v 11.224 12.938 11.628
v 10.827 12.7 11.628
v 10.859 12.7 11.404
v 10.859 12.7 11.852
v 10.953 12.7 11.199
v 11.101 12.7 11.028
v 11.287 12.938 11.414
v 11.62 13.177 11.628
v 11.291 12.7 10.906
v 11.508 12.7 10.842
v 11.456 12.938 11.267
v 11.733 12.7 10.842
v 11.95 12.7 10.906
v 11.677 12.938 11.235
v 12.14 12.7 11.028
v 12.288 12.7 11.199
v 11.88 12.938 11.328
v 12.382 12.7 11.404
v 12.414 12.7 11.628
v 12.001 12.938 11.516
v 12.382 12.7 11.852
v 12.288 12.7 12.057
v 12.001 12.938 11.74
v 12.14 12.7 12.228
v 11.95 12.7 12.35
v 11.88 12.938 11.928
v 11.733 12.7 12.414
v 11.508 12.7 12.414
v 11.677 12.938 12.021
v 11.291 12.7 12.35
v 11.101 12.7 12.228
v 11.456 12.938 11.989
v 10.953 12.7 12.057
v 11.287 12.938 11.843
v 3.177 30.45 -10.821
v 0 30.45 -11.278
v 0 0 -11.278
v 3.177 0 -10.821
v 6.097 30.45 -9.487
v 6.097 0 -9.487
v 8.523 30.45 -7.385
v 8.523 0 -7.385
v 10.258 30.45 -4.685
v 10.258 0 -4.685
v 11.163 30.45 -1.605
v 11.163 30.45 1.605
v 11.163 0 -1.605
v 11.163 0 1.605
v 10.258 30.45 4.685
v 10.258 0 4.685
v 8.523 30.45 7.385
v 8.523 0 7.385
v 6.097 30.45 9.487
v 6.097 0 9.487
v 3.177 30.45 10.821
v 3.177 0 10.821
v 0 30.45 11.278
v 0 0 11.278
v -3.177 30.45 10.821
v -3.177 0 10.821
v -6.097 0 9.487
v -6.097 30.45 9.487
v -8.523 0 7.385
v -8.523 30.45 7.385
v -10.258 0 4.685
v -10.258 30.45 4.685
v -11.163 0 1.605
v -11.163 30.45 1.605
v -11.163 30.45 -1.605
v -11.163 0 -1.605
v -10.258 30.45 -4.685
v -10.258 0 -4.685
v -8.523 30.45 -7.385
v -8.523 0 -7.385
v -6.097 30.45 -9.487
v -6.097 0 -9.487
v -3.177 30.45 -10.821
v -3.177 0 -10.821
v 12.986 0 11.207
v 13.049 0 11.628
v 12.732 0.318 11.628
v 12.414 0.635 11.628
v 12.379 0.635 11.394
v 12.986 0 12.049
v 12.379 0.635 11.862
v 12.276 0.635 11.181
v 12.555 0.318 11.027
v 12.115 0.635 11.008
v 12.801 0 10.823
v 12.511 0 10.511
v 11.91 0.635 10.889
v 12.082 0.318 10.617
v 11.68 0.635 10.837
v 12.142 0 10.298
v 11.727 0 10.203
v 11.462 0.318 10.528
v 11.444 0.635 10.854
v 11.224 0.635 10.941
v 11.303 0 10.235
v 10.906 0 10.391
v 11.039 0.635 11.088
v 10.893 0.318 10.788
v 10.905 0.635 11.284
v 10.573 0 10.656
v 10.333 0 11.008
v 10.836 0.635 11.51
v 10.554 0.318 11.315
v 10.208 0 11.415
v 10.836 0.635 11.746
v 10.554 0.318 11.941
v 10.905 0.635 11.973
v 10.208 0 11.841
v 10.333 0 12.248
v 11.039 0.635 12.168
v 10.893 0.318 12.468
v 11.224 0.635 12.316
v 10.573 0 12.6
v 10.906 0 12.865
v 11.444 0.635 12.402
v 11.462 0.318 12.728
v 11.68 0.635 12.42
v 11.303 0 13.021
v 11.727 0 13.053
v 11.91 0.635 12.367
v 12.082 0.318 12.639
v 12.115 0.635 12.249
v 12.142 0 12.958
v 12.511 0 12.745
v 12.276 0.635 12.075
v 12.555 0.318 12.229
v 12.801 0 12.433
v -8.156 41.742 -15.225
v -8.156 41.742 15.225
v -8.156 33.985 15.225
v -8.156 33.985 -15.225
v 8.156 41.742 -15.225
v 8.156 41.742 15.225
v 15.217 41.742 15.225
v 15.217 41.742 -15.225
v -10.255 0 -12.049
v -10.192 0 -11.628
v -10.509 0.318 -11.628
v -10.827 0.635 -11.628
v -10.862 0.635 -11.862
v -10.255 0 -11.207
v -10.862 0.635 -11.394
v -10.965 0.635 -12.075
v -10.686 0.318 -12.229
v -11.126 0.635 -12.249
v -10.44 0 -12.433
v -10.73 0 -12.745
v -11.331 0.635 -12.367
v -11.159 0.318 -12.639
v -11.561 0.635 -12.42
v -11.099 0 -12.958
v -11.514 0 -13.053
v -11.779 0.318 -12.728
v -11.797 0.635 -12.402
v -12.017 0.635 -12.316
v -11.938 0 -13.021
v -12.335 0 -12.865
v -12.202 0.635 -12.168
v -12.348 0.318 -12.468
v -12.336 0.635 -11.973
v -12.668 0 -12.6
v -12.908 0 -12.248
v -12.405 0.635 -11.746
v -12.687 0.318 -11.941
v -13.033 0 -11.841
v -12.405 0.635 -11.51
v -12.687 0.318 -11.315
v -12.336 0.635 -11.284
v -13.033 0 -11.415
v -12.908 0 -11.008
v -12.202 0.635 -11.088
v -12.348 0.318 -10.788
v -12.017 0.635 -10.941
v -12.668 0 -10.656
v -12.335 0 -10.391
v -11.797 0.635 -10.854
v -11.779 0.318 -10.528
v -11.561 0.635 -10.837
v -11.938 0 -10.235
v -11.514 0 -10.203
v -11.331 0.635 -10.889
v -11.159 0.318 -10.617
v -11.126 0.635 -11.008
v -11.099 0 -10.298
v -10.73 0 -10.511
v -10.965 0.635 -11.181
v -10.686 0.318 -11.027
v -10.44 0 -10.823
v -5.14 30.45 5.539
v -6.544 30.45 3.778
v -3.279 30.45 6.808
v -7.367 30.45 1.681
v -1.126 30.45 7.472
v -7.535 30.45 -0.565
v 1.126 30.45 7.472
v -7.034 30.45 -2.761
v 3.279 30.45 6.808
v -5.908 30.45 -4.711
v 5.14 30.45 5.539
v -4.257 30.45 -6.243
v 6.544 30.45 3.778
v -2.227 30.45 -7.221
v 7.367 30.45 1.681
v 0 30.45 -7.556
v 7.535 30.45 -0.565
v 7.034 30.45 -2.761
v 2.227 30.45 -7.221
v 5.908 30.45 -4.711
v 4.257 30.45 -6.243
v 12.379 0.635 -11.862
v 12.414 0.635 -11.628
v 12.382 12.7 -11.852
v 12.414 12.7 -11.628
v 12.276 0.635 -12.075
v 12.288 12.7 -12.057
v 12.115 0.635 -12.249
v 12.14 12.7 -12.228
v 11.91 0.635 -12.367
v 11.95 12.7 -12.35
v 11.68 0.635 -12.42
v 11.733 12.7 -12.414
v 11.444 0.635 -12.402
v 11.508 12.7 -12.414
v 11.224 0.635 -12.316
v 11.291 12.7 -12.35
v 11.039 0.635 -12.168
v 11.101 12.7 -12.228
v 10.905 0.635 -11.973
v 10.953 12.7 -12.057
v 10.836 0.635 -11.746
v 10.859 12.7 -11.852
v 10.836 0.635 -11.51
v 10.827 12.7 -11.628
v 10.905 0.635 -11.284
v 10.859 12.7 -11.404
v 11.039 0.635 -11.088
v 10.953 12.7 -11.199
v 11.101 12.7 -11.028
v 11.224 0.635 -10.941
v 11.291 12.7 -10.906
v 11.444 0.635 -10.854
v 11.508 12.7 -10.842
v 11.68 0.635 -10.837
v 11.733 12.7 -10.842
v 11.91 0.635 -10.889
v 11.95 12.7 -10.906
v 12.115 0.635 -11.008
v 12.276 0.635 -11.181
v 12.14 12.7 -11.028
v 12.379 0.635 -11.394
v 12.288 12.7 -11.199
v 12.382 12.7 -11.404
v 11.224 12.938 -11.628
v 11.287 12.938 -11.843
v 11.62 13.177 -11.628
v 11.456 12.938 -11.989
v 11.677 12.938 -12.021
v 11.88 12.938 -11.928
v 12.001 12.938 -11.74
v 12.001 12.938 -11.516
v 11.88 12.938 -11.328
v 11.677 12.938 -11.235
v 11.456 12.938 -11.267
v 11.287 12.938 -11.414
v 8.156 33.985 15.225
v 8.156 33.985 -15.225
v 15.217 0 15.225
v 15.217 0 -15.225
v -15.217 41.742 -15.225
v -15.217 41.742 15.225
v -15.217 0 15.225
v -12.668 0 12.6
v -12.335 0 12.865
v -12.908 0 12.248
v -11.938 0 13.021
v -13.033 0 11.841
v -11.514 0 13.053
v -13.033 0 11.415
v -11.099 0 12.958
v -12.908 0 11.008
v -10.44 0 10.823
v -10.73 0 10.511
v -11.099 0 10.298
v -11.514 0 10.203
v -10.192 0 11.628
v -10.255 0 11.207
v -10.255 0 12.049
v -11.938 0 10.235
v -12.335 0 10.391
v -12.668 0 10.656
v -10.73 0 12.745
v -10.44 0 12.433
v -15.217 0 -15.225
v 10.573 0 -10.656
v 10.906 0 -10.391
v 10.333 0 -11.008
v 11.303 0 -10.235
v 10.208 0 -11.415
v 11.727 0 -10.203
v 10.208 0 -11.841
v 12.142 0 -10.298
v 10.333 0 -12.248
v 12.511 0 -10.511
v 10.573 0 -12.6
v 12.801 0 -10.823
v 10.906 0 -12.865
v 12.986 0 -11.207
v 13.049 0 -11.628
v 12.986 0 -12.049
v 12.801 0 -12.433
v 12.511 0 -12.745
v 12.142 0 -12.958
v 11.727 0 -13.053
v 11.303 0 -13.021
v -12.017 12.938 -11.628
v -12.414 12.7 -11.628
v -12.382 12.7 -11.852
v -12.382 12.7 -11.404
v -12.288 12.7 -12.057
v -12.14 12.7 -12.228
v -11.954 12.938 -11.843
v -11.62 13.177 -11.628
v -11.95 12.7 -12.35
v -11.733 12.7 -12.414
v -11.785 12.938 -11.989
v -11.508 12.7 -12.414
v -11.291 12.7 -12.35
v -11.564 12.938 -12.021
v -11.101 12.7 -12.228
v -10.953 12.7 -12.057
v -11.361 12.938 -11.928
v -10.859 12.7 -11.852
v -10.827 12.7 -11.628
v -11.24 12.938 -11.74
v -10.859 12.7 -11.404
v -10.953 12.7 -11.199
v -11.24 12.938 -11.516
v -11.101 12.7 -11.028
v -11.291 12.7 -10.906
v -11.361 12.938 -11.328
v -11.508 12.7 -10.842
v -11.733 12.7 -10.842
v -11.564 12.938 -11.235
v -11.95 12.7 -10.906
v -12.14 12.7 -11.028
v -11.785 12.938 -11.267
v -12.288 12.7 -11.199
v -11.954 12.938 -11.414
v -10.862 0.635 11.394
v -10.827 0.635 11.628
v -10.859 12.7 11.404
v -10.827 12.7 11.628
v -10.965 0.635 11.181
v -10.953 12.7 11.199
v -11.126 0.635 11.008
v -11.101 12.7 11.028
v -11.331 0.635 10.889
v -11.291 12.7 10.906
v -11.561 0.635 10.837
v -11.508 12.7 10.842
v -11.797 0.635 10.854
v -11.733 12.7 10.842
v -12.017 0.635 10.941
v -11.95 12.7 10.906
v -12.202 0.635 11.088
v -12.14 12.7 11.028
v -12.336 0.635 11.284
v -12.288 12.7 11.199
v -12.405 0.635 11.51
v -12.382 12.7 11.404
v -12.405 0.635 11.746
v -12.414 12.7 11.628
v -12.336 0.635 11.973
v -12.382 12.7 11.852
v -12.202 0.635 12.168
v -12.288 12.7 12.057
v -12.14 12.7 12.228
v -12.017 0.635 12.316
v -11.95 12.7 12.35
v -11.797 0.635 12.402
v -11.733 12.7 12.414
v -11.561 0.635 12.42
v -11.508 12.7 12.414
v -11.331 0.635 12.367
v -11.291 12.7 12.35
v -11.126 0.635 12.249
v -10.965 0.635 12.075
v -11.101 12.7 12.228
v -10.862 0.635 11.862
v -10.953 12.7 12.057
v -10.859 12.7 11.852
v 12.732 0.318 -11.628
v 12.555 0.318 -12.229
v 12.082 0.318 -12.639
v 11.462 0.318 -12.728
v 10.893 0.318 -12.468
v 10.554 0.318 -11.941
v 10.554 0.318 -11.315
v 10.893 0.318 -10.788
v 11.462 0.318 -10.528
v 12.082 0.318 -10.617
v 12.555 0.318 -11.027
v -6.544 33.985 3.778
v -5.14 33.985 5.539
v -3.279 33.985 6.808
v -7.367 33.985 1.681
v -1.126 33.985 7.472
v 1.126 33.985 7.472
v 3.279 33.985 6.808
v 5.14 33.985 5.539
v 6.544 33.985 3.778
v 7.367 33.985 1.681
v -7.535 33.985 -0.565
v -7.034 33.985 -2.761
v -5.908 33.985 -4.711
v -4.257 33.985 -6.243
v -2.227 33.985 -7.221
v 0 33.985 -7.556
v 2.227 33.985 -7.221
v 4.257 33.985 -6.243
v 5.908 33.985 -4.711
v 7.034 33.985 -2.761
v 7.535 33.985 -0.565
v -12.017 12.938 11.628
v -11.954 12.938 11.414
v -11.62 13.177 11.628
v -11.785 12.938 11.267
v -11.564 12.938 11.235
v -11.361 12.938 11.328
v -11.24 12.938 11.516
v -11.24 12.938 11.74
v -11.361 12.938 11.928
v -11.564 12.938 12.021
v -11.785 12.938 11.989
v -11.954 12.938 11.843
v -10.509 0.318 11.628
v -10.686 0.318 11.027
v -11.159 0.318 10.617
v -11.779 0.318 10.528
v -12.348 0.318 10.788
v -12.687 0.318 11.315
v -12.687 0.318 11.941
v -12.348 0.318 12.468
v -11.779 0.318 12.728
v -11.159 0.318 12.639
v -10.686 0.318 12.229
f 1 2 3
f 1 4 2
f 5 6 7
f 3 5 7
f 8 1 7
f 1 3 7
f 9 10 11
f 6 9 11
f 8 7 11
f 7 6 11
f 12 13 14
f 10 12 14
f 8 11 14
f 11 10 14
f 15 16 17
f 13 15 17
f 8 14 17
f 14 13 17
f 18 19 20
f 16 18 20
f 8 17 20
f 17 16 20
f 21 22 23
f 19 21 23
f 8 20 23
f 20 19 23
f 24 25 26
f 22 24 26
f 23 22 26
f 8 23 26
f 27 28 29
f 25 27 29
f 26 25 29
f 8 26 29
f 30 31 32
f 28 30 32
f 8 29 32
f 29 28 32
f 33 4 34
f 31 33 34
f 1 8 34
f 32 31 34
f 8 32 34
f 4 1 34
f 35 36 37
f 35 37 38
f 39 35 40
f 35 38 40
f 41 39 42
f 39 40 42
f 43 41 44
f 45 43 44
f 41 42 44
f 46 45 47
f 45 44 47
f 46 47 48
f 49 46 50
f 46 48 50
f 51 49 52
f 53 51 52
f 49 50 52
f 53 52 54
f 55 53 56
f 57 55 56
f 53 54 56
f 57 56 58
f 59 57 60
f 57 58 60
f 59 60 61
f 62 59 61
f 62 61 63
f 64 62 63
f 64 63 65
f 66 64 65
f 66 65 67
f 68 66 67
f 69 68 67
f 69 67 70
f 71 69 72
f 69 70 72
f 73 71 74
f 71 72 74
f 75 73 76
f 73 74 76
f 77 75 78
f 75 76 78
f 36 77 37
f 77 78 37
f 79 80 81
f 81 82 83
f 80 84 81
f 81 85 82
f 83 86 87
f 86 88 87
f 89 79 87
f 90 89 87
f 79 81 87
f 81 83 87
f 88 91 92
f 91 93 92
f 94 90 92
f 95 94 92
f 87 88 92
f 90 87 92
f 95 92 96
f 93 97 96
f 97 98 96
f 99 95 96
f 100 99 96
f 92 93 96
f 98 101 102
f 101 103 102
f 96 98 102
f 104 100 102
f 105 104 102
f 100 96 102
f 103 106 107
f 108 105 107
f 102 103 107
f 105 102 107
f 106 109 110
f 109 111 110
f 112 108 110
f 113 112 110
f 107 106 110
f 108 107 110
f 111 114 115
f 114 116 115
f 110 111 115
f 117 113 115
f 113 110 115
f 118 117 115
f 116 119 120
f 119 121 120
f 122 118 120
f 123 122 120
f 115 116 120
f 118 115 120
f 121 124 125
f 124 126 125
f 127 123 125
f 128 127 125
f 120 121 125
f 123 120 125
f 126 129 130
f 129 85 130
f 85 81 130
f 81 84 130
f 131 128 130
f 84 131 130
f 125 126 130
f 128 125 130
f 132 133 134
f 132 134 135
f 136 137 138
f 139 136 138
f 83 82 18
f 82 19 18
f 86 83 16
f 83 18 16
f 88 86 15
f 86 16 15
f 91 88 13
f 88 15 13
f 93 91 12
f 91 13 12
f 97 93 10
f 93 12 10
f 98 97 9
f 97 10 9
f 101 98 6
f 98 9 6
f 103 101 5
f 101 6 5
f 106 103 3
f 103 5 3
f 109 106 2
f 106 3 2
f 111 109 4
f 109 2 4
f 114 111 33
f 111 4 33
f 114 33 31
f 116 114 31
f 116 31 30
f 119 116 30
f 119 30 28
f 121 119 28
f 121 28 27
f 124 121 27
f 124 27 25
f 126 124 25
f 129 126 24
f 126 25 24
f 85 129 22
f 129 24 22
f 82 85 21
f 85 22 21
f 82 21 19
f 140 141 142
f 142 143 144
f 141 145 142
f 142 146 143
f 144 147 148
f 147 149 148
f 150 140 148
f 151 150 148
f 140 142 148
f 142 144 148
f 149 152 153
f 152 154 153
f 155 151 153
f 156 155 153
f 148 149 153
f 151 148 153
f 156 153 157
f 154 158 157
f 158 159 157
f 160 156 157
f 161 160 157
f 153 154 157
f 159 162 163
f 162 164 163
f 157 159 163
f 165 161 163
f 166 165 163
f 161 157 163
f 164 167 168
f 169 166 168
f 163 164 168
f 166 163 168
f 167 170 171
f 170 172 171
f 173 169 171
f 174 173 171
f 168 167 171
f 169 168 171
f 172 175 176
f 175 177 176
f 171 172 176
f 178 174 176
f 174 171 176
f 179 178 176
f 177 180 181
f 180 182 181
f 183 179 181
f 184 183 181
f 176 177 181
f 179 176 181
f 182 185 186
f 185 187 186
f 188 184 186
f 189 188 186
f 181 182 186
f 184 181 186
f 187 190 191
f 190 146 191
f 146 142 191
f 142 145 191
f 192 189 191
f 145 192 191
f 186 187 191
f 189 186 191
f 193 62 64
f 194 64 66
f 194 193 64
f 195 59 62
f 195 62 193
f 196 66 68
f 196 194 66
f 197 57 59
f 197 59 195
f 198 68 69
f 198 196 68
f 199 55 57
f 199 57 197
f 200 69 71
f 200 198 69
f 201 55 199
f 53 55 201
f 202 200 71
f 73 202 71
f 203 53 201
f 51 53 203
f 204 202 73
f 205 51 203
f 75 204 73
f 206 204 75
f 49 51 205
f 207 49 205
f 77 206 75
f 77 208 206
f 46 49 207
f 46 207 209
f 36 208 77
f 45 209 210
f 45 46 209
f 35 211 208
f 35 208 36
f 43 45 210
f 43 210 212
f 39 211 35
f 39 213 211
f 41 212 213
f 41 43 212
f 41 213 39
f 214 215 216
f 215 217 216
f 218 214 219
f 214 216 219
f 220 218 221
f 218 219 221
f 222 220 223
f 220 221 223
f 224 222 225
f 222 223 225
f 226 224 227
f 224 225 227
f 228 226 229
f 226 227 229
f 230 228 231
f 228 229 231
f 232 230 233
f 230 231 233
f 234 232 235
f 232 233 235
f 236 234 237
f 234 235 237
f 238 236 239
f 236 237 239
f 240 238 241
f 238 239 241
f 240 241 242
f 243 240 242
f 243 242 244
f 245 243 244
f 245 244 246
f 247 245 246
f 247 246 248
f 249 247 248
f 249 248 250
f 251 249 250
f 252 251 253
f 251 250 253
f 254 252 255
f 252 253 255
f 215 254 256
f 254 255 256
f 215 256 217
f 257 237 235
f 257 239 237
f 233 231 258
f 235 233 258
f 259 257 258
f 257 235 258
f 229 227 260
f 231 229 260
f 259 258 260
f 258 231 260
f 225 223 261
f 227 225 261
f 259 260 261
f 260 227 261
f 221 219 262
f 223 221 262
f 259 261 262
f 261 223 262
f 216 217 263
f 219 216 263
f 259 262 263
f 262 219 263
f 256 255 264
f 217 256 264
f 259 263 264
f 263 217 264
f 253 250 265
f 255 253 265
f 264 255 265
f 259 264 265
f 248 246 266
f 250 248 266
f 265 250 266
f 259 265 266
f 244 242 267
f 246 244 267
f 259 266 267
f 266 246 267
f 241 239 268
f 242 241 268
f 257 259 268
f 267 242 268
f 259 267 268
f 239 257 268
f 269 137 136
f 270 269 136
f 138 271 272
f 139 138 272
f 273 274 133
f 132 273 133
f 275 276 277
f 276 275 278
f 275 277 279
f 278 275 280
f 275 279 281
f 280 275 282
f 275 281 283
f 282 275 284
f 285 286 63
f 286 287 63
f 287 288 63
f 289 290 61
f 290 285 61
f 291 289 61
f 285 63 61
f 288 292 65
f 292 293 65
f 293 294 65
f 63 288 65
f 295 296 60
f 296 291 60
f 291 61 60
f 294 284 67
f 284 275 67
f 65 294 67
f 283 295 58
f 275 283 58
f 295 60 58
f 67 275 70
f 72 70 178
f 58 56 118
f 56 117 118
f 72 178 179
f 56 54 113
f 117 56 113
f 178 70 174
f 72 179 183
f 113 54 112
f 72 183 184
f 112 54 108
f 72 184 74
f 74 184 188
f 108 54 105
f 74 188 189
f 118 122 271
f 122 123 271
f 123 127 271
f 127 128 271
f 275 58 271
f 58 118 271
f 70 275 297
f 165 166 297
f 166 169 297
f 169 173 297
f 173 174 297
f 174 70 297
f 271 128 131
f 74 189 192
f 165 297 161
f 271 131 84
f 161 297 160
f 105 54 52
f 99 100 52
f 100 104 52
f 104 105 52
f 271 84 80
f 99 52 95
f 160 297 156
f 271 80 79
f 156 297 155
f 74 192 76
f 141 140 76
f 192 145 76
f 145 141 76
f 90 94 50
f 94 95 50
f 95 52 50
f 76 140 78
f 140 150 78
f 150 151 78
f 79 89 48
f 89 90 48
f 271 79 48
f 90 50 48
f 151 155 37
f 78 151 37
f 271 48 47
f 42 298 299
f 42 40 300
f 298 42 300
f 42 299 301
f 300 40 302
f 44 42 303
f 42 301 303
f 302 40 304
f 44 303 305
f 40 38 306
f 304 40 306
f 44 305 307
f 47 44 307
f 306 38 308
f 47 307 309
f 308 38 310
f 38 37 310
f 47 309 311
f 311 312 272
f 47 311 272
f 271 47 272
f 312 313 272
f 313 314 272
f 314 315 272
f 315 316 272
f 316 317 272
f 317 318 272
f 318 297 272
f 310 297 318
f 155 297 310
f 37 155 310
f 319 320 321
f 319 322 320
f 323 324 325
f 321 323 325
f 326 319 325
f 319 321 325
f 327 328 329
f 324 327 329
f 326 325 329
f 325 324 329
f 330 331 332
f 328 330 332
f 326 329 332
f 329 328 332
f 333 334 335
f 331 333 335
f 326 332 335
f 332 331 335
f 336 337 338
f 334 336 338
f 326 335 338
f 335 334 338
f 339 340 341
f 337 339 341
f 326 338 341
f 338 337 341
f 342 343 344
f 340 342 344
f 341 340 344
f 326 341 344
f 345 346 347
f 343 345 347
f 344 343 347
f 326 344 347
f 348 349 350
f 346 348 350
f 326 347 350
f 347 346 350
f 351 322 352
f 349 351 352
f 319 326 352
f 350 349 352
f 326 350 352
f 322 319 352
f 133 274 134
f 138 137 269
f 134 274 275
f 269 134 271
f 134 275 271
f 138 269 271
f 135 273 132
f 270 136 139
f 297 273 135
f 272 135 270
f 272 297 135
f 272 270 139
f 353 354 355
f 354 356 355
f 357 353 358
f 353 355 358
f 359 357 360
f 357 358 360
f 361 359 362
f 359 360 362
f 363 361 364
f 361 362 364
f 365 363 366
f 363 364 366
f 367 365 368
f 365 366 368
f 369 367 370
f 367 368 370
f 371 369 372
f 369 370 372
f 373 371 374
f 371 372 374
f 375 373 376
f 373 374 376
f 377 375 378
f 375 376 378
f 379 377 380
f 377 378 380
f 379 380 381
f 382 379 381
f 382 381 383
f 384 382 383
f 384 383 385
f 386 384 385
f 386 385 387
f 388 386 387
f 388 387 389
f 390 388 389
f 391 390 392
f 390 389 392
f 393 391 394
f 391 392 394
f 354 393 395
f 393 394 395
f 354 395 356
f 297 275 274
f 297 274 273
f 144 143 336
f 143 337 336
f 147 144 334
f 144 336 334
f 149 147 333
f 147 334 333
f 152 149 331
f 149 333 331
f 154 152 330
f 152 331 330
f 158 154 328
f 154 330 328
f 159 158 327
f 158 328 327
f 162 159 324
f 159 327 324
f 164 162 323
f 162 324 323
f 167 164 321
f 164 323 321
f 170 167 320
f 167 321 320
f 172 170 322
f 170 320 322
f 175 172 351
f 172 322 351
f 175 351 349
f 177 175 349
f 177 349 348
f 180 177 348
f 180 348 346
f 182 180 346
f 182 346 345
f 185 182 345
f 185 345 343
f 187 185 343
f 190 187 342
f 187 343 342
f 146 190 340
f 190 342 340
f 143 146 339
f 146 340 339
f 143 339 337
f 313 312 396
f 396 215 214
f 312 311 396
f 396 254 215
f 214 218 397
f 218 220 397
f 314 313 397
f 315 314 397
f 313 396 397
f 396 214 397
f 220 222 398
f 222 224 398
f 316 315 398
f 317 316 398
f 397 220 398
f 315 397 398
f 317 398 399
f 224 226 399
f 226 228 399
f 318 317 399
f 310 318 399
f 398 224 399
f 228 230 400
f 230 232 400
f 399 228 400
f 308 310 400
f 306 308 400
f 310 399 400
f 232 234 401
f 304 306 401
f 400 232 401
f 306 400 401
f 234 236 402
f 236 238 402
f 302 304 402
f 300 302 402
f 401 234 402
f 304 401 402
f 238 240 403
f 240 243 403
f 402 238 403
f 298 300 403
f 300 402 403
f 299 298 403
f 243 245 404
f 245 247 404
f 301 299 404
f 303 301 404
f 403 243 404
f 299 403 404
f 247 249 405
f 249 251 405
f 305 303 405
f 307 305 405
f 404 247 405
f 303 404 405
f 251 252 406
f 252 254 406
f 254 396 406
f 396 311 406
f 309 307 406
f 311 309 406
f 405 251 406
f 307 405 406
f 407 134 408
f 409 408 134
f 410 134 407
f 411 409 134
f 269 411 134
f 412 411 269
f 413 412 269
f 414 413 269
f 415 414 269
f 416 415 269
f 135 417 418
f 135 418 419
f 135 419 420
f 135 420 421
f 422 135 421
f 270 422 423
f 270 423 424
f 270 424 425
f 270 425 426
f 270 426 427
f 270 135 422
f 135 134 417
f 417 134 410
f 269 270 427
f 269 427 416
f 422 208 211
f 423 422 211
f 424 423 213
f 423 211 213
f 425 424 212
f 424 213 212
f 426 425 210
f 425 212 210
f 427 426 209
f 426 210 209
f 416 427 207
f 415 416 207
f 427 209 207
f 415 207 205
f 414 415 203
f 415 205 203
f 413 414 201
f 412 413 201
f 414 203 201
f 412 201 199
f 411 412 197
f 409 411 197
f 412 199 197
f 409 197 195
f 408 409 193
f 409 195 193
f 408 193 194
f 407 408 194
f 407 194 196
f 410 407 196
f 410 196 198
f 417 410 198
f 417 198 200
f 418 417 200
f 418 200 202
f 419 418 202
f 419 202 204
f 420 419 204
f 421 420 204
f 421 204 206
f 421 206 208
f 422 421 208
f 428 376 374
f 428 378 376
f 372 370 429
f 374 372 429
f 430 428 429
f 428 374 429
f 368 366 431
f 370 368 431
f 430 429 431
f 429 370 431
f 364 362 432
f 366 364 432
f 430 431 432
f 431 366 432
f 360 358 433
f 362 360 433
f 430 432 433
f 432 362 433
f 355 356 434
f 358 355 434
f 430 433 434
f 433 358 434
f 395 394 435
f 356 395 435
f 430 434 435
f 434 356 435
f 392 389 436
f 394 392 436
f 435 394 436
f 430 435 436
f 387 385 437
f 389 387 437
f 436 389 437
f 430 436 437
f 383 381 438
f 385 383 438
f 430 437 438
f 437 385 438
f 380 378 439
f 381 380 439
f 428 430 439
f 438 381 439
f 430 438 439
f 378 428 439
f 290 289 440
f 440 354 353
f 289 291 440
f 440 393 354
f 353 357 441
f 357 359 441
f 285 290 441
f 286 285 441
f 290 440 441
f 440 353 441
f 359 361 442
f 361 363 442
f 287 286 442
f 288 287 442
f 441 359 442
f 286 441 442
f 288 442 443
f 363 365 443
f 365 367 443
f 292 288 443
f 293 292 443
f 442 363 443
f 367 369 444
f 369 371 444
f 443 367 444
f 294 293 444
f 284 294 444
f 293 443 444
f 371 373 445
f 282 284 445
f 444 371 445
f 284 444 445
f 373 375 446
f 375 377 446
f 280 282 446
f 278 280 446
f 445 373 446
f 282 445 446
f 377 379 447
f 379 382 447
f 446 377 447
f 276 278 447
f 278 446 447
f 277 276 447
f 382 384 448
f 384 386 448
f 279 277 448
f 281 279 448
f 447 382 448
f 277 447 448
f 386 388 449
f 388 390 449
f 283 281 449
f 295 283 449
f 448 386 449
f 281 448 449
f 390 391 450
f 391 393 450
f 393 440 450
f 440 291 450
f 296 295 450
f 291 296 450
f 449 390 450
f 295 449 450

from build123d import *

# Parameters (mm, degrees)
SKETCH1_W                                = 30.43428
SKETCH1_H                                = 30.44952
BOSS_EXTRUDE1_DEPTH                      = 41.74236
SKETCH4_R                                = 7.5565
CUT_EXTRUDE3_DEPTH                       = 36.539424
SKETCH6_W                                = 16.31188
SKETCH6_H                                = 30.44952
CUT_EXTRUDE5_DEPTH                       = 7.75716
SKETCH8_R                                = 11.2776
CUT_EXTRUDE6_DEPTH                       = 30.44952
F_1_16_0_0625_DIAMETER_HOLE1_D           = 1.5875
F_1_16_0_0625_DIAMETER_HOLE1_DEPTH       = 12.7
F_1_16_0_0625_DIAMETER_HOLE1_CSINK_D     = 2.8575
F_1_16_0_0625_DIAMETER_HOLE1_CSINK_ANGLE = 90
F_1_16_0_0625_DIAMETER_HOLE1_TIP         = 0.476933116


with BuildPart() as part:
    # Sketch1 → Boss-Extrude1 (new body)
    with BuildSketch(Plane(origin=(0, 0, 0), x_dir=(1, 0, 0), z_dir=(0, 1, 0))):
        Rectangle(SKETCH1_W, SKETCH1_H)
    extrude(amount=BOSS_EXTRUDE1_DEPTH)

    # Sketch4 → Cut-Extrude3 (cut)
    with BuildSketch(Plane.XZ):
        with Locations(Location((0, 0, 0), (0, 0, 270))):
            Circle(SKETCH4_R)
    extrude(amount=-CUT_EXTRUDE3_DEPTH, mode=Mode.SUBTRACT)

    # Sketch6 → Cut-Extrude5 (cut)
    with BuildSketch(Plane(origin=(0, 41.74236, 0), x_dir=(1, 0, 0), z_dir=(0, 1, 0))):
        Rectangle(SKETCH6_W, SKETCH6_H)
    extrude(amount=-CUT_EXTRUDE5_DEPTH, mode=Mode.SUBTRACT)

    # Sketch8 → Cut-Extrude6 (cut)
    with BuildSketch(Plane.XZ):
        with Locations(Location((0, 0, 0), (0, 0, 270))):
            Circle(SKETCH8_R)
    extrude(amount=-CUT_EXTRUDE6_DEPTH, mode=Mode.SUBTRACT)

    # 1/16 (0.0625) Diameter Hole1
    with Locations(Plane(origin=(0, 0, 0), x_dir=(-1, 0, 0), z_dir=(0, -1, 0))):
        with Locations((-11.6205, 11.62812), (11.6205, 11.62812), (11.6205, -11.62812), (-11.6205, -11.62812)):
            CounterSinkHole(F_1_16_0_0625_DIAMETER_HOLE1_D / 2, F_1_16_0_0625_DIAMETER_HOLE1_CSINK_D / 2, depth=F_1_16_0_0625_DIAMETER_HOLE1_DEPTH, counter_sink_angle=F_1_16_0_0625_DIAMETER_HOLE1_CSINK_ANGLE)
            with Locations((0, 0, -(F_1_16_0_0625_DIAMETER_HOLE1_DEPTH + F_1_16_0_0625_DIAMETER_HOLE1_TIP / 2))):  # 118° drill point
                Cone(0, F_1_16_0_0625_DIAMETER_HOLE1_D / 2, F_1_16_0_0625_DIAMETER_HOLE1_TIP, mode=Mode.SUBTRACT)


solid = part.part
